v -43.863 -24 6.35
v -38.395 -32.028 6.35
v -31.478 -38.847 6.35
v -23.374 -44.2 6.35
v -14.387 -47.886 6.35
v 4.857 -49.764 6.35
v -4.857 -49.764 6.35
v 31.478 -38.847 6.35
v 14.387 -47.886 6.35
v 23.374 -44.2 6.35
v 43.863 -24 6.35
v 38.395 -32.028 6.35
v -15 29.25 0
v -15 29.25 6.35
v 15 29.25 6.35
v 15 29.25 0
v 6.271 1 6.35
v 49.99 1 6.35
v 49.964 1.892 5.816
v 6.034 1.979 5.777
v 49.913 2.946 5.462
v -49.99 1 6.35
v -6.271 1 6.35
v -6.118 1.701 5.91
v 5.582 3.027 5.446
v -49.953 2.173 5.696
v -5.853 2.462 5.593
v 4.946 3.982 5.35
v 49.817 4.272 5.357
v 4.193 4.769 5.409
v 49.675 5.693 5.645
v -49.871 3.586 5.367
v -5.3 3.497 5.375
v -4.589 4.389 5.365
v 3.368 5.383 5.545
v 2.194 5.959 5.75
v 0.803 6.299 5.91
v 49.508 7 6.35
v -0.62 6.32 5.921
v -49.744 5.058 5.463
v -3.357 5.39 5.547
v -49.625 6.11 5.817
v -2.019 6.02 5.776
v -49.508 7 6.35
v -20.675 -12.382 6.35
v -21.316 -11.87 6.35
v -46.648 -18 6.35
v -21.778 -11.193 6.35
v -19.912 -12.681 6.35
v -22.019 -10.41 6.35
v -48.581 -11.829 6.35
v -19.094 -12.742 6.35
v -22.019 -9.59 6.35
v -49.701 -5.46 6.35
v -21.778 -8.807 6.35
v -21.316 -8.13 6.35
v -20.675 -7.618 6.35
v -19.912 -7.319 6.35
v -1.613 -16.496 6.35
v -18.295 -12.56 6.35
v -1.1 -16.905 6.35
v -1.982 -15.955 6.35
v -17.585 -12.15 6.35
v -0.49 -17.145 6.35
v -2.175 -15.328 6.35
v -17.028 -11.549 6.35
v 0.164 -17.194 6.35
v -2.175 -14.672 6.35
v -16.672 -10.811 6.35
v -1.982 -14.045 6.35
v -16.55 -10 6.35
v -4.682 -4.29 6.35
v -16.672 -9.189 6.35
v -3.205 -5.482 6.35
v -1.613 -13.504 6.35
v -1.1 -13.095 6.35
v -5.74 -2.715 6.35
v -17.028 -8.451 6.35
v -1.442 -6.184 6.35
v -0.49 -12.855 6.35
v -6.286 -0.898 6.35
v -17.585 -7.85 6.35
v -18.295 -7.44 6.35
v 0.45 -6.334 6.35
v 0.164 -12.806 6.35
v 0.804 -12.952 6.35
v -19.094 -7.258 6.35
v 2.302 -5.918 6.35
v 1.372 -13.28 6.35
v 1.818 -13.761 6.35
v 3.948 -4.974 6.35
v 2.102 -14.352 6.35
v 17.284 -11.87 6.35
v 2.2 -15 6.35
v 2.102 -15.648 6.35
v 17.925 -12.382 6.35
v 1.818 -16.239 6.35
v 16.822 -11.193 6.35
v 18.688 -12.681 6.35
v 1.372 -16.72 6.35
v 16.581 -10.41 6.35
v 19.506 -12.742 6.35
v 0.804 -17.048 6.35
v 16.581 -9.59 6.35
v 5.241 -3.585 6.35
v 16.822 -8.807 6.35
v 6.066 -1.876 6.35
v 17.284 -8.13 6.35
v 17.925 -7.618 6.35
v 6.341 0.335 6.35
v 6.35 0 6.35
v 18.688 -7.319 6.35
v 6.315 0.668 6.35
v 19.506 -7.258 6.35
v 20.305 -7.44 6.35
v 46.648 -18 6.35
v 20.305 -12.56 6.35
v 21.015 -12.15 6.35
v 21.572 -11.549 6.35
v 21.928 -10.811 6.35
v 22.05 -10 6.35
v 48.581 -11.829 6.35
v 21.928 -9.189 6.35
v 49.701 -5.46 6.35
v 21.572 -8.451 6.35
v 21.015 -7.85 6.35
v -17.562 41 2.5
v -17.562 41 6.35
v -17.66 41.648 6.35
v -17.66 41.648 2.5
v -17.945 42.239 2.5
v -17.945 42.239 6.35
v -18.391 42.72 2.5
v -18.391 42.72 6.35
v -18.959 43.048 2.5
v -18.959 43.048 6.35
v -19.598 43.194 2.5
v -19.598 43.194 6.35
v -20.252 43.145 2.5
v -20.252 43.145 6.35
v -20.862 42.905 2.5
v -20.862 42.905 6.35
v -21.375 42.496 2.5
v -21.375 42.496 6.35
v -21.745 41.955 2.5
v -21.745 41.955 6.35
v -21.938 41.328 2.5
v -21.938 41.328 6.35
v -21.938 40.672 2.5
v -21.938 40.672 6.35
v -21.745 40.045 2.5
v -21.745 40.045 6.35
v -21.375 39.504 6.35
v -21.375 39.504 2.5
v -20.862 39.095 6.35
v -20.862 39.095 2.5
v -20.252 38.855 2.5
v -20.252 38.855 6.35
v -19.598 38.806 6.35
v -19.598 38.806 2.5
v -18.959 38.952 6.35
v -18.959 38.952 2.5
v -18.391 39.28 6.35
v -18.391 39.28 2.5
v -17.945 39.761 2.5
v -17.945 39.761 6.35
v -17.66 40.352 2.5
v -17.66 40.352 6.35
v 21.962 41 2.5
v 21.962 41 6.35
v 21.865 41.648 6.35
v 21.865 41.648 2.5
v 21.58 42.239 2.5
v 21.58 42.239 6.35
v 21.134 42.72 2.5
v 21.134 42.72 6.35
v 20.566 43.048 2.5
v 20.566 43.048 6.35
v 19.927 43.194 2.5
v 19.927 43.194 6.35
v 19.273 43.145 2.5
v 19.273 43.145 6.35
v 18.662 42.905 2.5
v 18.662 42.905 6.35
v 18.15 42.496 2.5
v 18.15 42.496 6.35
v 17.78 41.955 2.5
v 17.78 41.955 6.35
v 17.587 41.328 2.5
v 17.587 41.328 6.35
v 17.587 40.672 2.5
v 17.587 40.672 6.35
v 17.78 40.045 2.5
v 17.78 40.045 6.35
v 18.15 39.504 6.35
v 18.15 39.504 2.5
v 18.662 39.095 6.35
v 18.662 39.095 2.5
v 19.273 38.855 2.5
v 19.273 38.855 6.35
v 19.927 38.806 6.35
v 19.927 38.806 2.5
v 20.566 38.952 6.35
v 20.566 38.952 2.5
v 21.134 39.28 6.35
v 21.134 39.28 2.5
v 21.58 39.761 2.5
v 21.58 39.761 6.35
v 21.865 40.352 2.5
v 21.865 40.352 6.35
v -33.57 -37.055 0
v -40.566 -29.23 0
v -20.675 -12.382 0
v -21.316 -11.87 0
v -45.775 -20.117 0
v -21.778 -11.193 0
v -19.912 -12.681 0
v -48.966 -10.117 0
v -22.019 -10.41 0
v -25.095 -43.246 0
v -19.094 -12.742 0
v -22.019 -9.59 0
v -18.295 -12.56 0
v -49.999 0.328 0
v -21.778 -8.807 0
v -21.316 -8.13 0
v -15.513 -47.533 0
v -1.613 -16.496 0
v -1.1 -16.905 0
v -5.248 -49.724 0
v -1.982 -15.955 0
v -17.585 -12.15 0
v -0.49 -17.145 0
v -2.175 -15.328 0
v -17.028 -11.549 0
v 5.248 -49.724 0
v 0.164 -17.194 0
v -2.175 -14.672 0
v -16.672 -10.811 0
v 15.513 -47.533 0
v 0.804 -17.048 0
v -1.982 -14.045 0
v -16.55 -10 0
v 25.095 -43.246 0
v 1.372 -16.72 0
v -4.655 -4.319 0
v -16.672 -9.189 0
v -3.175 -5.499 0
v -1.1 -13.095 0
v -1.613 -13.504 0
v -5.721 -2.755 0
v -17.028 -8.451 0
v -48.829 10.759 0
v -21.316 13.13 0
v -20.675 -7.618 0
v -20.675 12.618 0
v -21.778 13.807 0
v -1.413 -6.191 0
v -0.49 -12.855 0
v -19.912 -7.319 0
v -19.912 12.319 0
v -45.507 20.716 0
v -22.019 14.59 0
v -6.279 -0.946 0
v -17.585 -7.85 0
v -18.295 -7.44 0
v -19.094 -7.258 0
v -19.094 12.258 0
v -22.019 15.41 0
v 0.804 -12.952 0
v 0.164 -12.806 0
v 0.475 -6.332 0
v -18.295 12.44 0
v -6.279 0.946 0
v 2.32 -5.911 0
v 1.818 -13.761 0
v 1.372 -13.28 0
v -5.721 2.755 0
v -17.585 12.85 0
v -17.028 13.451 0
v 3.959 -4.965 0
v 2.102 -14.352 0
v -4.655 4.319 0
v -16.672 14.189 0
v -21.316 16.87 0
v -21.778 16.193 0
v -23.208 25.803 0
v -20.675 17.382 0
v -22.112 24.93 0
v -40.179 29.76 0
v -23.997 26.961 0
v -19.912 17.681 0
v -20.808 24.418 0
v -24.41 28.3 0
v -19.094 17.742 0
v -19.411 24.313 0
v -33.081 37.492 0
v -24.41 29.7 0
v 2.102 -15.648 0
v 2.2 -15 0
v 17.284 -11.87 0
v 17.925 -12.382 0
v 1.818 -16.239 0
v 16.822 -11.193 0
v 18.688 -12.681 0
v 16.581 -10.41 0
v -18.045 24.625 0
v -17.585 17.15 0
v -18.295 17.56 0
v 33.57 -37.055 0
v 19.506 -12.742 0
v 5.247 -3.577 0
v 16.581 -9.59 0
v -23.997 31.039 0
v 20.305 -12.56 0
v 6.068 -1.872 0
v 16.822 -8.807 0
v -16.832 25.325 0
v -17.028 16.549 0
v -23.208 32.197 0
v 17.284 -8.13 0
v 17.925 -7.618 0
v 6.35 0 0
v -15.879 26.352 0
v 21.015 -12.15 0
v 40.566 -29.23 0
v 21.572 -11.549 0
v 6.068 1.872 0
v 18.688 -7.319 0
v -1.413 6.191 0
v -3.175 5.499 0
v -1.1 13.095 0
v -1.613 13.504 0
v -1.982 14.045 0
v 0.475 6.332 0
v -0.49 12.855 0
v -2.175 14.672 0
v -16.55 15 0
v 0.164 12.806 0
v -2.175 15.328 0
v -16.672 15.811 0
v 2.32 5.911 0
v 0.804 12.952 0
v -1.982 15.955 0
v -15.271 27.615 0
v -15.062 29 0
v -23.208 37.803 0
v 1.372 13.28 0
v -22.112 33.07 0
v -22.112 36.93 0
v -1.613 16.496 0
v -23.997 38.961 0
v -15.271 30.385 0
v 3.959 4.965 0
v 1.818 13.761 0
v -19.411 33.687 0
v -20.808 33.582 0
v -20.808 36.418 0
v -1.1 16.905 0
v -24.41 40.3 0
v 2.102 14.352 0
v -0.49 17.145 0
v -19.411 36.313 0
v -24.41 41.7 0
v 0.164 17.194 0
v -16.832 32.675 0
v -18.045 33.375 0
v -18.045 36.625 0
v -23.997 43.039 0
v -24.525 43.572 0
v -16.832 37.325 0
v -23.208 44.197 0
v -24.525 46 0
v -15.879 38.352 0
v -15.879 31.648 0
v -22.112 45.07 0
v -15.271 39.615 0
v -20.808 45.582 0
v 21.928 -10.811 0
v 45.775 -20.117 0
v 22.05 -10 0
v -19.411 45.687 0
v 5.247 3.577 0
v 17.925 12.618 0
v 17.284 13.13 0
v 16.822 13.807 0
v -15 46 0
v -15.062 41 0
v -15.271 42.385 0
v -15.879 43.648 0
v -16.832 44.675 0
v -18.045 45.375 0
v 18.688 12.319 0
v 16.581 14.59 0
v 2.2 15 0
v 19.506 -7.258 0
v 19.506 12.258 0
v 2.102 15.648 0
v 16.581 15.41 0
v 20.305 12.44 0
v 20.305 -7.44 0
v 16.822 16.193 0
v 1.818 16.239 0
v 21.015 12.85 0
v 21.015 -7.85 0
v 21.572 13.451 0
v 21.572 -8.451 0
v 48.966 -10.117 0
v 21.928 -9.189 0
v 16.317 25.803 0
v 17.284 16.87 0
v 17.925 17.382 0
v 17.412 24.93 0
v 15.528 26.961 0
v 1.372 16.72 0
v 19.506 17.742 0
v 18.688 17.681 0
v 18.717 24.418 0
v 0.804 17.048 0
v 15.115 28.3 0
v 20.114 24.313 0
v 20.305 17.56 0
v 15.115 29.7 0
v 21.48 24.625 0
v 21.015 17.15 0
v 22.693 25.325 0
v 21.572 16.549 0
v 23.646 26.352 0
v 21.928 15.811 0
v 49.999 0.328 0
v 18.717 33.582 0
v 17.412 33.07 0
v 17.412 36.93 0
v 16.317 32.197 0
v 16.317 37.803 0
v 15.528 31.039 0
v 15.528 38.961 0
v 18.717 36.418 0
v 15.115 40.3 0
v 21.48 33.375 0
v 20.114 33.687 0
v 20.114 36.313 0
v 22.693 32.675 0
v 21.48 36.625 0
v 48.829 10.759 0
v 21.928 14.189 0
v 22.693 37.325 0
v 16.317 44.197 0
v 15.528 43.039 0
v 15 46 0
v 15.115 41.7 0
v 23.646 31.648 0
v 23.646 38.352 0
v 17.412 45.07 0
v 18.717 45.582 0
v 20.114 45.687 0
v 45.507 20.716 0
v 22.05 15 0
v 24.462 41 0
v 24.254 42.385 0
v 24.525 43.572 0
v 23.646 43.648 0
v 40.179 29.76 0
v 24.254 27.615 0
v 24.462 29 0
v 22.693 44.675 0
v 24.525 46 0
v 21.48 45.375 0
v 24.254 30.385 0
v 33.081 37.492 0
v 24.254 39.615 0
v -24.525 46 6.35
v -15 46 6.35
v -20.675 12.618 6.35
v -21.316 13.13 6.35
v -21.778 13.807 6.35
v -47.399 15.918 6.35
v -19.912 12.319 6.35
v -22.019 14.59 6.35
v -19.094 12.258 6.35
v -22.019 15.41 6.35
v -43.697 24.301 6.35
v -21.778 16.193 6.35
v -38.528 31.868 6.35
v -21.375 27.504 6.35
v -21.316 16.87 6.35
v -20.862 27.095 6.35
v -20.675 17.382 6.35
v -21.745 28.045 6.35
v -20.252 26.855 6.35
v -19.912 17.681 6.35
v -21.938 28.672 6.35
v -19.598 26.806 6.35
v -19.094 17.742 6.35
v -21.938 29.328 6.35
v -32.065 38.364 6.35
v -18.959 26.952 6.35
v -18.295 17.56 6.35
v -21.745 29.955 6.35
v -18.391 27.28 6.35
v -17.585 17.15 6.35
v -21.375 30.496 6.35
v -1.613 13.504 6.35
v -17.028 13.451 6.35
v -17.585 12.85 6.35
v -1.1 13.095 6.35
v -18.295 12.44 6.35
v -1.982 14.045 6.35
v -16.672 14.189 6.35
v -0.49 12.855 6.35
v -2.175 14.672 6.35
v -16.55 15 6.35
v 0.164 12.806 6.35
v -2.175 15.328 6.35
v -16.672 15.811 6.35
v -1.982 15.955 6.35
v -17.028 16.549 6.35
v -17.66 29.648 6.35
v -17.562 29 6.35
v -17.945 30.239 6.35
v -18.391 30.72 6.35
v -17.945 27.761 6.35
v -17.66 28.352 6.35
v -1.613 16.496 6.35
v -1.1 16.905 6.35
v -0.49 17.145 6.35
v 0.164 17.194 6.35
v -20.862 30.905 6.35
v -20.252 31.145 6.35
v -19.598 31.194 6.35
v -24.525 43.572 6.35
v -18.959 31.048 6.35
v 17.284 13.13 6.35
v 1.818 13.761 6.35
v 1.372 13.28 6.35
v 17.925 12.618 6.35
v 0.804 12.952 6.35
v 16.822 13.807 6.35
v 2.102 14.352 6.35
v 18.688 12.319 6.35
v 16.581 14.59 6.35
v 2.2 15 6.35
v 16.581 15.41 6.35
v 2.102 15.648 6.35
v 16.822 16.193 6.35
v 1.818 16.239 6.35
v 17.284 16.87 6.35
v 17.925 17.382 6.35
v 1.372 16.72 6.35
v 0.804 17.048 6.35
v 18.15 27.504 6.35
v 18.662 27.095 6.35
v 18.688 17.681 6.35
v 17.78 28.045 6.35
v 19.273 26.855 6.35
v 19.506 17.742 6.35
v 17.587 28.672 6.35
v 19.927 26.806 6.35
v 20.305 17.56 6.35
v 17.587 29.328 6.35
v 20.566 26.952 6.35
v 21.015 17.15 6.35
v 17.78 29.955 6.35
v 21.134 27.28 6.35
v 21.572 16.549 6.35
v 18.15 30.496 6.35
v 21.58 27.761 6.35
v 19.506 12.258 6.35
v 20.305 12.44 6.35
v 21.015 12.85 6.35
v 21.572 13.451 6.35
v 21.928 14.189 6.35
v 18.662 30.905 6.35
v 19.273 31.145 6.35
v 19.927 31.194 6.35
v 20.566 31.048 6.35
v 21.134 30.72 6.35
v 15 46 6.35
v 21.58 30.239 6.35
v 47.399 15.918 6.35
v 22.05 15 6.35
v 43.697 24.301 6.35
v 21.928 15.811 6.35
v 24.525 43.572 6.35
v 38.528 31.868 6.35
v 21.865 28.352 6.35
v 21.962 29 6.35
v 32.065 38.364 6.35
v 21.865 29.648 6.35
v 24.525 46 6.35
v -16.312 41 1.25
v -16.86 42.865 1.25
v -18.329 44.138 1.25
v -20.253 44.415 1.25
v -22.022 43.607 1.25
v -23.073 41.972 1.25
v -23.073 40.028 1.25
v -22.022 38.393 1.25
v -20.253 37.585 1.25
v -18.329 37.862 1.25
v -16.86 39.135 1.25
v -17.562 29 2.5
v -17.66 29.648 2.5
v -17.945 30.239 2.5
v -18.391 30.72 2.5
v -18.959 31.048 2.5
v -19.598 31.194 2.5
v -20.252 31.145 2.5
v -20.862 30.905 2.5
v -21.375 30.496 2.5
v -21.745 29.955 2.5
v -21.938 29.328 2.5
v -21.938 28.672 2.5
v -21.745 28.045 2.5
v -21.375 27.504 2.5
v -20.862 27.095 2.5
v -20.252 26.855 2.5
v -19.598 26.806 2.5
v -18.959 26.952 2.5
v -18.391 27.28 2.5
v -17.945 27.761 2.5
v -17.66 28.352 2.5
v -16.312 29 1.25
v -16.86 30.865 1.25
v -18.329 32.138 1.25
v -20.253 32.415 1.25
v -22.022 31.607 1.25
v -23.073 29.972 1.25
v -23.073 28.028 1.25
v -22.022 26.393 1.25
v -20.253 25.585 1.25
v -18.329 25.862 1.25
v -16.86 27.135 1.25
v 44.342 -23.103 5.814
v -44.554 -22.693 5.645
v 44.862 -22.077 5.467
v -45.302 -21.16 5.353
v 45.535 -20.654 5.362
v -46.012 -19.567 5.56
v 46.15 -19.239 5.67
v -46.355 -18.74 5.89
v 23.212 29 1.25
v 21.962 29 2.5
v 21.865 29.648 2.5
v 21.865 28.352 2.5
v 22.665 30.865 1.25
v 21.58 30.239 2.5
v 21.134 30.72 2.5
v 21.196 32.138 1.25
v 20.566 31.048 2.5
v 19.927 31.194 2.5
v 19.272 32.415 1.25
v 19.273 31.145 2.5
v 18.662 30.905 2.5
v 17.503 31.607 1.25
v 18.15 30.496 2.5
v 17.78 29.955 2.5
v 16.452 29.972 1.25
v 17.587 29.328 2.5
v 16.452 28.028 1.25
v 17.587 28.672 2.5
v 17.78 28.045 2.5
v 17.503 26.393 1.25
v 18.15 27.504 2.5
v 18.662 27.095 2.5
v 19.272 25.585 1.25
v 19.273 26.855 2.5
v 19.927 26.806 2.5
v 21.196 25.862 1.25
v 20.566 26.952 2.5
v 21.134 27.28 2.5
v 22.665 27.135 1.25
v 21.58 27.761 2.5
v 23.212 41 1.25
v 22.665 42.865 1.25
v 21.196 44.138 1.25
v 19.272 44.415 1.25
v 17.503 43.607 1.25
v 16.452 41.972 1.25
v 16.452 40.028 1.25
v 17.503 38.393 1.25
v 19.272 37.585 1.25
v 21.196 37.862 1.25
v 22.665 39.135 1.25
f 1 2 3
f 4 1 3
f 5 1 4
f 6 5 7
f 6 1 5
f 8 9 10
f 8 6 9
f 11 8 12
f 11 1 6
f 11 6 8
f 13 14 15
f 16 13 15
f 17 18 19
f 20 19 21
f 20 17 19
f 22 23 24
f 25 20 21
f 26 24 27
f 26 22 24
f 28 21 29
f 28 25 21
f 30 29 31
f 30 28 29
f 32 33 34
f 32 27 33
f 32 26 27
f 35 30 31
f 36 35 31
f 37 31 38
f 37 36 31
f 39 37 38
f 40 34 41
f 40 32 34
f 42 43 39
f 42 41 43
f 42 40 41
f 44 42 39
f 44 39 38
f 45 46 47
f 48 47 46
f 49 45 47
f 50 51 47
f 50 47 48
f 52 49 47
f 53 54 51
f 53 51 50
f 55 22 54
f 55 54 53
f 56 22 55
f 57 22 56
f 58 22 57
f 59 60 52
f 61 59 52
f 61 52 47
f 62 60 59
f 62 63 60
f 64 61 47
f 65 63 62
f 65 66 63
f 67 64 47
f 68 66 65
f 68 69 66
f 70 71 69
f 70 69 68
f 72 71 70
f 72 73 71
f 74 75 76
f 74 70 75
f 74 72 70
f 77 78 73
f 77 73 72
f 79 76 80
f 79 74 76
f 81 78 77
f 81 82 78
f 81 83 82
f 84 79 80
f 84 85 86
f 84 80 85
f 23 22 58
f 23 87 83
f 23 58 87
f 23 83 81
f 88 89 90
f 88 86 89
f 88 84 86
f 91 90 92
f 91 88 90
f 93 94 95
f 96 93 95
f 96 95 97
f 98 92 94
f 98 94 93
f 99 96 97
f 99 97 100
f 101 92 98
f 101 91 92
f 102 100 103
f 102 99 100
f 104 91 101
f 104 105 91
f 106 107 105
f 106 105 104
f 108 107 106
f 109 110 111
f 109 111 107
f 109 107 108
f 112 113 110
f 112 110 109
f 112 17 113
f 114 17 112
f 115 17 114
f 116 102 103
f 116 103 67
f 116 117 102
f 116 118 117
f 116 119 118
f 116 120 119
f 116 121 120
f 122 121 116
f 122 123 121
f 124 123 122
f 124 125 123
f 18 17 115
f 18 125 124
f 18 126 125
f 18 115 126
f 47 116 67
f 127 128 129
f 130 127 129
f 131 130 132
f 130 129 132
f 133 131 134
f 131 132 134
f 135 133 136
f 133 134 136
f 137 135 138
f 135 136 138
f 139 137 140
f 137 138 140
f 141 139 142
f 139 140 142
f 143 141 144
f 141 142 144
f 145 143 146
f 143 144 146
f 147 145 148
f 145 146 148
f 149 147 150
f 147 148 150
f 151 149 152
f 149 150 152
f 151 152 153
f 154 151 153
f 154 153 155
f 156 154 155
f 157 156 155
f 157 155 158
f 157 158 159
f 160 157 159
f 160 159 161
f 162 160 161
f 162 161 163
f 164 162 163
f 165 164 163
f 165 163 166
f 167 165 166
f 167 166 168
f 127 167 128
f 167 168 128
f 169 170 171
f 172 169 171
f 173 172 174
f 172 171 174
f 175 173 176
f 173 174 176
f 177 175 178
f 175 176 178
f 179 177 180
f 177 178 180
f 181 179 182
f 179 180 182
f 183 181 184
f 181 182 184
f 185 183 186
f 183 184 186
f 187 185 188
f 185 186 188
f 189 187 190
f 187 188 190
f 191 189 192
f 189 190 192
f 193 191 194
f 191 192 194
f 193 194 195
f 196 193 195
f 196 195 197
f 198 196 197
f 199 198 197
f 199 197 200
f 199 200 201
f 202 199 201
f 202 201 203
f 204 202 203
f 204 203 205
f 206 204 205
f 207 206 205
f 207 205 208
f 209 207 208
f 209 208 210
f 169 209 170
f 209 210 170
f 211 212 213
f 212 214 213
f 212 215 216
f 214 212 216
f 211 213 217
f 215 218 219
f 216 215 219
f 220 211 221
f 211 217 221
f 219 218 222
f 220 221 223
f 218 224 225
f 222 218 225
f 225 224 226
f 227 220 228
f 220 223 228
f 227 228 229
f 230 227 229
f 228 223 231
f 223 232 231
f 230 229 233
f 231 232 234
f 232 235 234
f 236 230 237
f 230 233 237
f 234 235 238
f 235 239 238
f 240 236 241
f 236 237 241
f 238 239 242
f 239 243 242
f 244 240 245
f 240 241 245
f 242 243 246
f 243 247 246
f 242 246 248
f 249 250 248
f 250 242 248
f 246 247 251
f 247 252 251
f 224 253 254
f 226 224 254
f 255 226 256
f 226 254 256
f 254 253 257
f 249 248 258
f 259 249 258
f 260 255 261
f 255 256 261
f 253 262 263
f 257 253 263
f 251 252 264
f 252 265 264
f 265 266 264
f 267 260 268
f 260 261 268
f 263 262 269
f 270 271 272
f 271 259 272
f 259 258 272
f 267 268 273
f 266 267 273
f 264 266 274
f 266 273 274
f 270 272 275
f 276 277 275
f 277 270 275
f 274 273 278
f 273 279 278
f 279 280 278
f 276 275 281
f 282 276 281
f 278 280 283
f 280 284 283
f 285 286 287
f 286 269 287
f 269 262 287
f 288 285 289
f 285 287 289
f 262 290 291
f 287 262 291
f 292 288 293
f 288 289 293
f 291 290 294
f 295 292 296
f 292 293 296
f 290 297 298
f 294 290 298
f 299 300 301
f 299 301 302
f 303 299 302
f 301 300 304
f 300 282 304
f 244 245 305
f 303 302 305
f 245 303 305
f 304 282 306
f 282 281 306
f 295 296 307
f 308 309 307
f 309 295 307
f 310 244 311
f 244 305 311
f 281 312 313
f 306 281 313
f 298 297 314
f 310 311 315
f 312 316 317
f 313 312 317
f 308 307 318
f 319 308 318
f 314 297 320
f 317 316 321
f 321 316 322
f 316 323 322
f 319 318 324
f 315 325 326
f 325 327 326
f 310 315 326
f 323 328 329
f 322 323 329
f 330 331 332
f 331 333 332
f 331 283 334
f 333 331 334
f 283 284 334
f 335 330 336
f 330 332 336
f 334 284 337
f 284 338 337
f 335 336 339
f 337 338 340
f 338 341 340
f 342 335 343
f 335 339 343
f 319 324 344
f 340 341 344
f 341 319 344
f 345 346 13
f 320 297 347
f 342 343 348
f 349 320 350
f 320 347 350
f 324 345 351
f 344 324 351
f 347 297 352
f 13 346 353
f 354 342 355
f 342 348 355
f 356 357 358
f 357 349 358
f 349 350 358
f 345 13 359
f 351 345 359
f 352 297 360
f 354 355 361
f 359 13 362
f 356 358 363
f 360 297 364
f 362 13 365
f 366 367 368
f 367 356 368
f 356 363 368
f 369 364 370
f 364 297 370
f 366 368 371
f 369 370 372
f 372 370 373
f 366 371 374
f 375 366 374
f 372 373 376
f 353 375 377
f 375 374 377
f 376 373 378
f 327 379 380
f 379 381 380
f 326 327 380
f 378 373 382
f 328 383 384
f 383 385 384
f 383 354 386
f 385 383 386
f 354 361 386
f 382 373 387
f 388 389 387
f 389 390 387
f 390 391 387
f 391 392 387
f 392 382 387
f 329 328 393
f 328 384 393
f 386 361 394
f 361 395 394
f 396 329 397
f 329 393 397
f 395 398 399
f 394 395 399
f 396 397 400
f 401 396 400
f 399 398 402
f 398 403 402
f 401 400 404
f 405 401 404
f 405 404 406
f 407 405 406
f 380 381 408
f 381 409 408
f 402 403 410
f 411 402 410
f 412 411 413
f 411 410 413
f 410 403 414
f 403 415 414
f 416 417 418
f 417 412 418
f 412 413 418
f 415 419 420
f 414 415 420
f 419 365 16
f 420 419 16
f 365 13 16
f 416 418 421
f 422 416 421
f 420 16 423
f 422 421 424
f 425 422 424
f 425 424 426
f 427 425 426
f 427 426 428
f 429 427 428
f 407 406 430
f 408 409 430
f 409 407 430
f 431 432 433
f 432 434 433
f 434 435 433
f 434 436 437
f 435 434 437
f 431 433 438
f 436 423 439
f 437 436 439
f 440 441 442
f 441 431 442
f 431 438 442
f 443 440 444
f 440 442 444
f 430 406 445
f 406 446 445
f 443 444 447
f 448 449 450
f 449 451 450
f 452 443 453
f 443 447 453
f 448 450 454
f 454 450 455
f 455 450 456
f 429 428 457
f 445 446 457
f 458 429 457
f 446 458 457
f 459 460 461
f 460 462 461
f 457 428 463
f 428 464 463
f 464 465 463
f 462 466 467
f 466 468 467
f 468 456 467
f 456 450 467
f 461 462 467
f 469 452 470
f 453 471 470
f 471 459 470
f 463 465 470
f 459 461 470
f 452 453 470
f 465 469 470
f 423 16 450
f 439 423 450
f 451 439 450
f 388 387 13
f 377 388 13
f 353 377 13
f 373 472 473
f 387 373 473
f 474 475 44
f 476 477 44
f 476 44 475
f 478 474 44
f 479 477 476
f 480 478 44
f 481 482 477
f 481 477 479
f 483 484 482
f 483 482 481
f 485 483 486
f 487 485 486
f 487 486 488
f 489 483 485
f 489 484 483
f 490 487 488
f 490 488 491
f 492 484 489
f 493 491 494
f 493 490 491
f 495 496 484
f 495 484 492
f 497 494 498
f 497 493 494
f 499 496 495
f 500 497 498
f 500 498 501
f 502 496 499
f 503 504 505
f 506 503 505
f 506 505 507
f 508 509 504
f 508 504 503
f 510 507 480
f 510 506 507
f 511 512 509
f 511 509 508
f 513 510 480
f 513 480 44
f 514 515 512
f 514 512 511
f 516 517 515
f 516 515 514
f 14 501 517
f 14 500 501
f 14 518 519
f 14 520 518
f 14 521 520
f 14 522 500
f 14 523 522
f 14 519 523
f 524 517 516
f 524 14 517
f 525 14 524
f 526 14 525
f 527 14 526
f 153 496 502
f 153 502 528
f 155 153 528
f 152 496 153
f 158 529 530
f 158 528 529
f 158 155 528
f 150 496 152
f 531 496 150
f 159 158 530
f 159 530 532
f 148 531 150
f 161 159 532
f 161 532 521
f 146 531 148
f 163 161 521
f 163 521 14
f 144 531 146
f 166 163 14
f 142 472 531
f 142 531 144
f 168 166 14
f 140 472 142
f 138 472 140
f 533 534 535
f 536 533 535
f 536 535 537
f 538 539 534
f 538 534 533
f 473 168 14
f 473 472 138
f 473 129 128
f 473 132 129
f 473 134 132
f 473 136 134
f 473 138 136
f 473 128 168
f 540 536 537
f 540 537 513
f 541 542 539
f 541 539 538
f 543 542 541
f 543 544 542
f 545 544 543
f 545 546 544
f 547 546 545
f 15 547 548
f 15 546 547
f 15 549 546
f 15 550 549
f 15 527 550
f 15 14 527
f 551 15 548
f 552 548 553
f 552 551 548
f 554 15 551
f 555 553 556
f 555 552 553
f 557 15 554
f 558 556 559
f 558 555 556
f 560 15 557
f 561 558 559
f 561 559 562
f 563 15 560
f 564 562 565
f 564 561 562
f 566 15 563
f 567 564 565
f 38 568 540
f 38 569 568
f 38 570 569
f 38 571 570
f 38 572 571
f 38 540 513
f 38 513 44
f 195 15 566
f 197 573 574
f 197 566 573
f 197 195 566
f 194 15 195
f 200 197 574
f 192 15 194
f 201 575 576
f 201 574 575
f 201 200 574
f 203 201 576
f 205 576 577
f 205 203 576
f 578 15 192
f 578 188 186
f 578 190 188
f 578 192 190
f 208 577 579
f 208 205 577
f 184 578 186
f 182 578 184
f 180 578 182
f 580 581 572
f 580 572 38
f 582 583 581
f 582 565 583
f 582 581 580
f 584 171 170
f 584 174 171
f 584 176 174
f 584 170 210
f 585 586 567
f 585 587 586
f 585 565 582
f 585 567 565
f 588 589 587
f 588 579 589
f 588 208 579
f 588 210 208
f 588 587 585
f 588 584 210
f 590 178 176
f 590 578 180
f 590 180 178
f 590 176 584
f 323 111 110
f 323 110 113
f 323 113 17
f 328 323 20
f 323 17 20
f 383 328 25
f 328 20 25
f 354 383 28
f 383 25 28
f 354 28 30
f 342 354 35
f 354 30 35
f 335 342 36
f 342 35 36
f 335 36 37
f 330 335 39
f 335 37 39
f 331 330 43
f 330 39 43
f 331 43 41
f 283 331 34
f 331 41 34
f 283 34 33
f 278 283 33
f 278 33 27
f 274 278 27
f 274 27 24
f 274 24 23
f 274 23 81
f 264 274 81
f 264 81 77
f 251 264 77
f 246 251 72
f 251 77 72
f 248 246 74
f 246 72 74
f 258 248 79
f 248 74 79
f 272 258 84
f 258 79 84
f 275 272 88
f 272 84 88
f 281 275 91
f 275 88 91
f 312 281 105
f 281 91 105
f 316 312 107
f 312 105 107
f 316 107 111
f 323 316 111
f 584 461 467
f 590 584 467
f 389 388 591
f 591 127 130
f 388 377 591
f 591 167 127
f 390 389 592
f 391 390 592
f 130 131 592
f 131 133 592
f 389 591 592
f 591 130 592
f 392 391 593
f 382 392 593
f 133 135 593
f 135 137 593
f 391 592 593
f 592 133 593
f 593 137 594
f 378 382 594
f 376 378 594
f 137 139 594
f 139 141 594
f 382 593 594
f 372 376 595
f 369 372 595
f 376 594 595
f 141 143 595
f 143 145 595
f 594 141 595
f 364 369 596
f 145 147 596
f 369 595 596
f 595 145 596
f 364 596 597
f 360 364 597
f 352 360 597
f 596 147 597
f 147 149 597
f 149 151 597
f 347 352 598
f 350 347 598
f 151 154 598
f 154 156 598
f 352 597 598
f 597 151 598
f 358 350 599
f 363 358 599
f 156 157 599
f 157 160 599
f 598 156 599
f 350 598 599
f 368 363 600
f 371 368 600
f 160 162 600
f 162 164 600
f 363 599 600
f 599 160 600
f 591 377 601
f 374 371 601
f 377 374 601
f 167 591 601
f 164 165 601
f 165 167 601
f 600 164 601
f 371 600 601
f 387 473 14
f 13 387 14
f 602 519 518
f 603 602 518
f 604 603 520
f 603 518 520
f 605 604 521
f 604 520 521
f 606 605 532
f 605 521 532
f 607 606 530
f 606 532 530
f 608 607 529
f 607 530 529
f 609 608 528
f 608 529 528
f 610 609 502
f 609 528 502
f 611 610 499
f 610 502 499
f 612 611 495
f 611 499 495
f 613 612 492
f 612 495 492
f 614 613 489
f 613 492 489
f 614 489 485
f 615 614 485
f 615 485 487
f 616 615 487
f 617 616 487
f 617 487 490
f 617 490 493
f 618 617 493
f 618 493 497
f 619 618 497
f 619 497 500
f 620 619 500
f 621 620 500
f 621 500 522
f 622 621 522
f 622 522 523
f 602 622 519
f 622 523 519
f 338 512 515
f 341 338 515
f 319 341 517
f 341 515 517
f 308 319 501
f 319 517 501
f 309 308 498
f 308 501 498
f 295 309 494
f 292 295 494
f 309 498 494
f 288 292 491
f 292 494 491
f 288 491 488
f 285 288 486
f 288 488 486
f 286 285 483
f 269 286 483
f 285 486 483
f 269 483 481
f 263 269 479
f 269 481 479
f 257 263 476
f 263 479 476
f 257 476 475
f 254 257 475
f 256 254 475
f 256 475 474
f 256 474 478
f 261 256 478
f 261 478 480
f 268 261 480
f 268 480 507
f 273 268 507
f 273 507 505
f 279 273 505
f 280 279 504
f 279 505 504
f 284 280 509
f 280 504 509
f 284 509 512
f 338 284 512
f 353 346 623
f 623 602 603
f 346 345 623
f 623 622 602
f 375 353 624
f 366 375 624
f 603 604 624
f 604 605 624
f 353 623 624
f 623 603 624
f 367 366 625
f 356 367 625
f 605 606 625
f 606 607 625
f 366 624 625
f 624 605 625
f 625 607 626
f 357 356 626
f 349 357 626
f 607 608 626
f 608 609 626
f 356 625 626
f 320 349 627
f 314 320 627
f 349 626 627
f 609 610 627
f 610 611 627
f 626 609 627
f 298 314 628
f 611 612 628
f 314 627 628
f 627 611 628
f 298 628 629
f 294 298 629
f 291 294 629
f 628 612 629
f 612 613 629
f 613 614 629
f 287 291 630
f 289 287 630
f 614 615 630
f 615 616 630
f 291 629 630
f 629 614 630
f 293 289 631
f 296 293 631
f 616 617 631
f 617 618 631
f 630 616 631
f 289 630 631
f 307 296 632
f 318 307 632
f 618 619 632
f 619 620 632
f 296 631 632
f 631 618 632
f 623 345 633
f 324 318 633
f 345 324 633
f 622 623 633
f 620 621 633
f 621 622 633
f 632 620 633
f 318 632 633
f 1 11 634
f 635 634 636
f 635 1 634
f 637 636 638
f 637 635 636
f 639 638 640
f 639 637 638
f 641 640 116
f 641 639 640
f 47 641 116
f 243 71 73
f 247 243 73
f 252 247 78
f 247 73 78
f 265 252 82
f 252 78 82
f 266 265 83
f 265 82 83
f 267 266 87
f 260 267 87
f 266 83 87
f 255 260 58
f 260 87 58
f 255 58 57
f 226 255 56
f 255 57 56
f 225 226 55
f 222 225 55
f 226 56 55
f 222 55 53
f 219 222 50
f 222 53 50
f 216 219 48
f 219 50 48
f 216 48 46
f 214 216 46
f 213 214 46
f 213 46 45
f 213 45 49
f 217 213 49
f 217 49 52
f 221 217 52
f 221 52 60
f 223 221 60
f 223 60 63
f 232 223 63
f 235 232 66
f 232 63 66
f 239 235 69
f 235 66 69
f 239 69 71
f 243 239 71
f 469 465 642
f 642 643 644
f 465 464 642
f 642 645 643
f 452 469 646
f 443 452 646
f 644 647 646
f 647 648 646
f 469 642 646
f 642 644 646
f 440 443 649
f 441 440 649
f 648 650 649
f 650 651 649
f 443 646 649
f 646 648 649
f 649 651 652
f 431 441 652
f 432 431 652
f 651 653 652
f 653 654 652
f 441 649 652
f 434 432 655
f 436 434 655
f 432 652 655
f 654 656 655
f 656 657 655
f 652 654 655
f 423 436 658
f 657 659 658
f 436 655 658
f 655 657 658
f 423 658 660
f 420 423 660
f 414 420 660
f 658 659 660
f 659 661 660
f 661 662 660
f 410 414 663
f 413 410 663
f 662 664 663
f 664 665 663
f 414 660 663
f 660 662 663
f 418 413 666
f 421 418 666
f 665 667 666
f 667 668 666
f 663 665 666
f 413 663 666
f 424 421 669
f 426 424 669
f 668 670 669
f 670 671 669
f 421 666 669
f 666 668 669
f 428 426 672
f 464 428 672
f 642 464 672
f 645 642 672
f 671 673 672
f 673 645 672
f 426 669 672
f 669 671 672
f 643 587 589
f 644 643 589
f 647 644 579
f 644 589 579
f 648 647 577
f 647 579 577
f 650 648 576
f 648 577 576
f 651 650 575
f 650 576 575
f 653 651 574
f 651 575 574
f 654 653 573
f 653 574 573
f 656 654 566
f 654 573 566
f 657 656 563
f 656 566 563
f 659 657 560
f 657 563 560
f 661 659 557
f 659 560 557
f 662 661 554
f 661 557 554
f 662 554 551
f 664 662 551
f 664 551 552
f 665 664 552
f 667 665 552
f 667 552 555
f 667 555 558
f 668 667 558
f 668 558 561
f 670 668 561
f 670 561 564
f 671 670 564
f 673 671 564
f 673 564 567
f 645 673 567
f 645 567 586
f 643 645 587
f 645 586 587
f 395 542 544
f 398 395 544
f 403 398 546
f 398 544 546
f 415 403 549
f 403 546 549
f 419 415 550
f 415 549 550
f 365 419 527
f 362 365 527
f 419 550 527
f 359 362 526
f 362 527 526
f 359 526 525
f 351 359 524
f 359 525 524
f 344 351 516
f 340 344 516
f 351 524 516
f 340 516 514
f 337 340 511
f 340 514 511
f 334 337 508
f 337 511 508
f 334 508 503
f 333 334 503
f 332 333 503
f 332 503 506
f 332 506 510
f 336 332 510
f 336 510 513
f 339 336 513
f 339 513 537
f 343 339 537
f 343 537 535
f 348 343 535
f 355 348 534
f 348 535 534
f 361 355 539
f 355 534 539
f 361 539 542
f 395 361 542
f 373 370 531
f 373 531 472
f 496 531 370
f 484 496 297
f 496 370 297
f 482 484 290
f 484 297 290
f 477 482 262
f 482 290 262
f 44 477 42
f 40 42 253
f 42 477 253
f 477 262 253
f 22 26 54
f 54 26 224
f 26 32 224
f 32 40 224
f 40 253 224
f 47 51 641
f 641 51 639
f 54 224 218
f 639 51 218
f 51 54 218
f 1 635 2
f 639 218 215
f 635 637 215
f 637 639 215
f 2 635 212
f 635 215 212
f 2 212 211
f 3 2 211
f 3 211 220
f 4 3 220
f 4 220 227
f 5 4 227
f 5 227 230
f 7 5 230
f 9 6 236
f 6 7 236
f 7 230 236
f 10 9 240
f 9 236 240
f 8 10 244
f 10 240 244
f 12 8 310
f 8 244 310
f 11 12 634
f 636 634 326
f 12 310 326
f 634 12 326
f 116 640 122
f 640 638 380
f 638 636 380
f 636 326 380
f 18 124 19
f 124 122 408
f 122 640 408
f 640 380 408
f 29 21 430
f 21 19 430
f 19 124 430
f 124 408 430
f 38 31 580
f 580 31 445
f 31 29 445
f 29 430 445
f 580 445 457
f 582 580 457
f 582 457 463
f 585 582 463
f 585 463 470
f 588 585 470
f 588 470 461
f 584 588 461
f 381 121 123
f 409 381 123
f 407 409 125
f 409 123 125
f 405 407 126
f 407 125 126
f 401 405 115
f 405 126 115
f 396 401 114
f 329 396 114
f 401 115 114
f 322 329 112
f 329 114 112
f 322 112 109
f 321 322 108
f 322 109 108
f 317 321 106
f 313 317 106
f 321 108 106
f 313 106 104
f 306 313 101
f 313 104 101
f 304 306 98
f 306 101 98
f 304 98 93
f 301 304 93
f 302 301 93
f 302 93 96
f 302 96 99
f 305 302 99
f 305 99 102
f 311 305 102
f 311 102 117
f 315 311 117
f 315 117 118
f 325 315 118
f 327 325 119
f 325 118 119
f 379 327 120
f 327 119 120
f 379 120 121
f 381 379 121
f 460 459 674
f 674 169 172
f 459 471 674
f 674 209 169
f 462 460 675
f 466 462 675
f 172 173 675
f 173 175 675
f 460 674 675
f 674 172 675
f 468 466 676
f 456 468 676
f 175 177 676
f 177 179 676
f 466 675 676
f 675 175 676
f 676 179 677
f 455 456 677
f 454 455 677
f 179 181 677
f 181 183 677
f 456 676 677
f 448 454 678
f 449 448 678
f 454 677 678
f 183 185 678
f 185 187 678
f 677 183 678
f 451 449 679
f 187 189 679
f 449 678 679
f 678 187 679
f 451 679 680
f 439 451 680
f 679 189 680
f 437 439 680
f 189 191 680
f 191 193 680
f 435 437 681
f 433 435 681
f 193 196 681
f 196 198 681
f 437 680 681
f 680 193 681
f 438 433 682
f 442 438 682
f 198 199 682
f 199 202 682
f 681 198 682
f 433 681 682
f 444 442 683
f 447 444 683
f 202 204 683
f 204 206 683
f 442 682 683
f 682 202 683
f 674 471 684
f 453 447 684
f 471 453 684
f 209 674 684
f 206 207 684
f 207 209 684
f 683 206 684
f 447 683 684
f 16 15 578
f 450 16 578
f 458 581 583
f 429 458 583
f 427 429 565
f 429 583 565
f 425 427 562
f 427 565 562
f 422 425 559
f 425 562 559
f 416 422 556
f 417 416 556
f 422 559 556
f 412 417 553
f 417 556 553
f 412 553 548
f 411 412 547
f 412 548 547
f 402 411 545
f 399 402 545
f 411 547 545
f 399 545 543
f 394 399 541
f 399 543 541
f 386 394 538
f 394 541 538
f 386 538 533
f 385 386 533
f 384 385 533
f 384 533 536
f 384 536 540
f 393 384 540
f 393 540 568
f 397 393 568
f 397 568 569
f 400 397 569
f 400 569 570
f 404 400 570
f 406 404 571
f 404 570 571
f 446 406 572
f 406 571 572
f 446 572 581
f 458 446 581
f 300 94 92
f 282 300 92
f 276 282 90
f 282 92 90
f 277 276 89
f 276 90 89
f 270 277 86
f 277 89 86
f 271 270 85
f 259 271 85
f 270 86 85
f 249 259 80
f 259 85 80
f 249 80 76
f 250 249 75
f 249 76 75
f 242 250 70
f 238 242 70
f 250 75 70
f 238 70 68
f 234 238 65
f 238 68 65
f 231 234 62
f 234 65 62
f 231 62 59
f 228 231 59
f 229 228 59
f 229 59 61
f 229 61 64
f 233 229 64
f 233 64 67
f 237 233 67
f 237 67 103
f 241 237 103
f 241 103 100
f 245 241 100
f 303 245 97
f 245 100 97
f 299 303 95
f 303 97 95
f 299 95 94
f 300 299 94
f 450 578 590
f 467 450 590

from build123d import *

# Parameters (mm, degrees)
SKETCH1_R               = 50
EXTRUDE_1_4_DEPTH       = 6.35
CUT_EXTRUDE1_DEPTH      = 6.35
SKETCH3_W               = 9.525
SKETCH3_H               = 16.75
BOSS_EXTRUDE2_DEPTH     = 6.35
SKETCH4_R               = 2.2
M4_THROUGH_DEPTH        = 6.35
SKETCH5_R               = 6.35
CUT_EXTRUDE2_DEPTH      = 6.35
SKETCH6_R               = 2.2
M4_THROUGH2_DEPTH       = 6.35
SKETCH7_R               = 2.75
M5_THROUGH_DEPTH        = 6.35
CHAMFER1_SIZE           = 2.5
CUT_EXTRUDE4_DEPTH      = 71.995228713
CUT_EXTRUDE4_DEPTH_BACK = 71.995228713
SKETCH8_R               = 5


with BuildPart() as part:
    # Sketch1 → 1/4 (new body)
    with BuildSketch(Plane.XY):
        Circle(SKETCH1_R)
    extrude(amount=EXTRUDE_1_4_DEPTH)

    # Sketch2 → Cut-Extrude1 (cut)
    with BuildSketch(Plane.XY.offset(6.35)):
        Polygon((-15, 46), (-15, 29.25), (15, 29.25), (15, 46), (28.100203936, 46), (28.100203936, 76.142415264), (-30.736146894, 76.142415264), (-30.736146894, 46), align=None)
    extrude(amount=-CUT_EXTRUDE1_DEPTH, mode=Mode.SUBTRACT)

    # Sketch3 → Boss-Extrude2 (add)
    with BuildSketch(Plane.XY.offset(6.35)):
        with Locations((-19.7625, 37.625)):
            Rectangle(SKETCH3_W, SKETCH3_H)
        with Locations((19.7625, 37.625)):
            Rectangle(SKETCH3_W, SKETCH3_H)
    extrude(amount=-BOSS_EXTRUDE2_DEPTH)

    # Sketch4 → M4_through (cut)
    with BuildSketch(Plane.XY.offset(6.35)):
        with Locations((-19.7625, 41)):
            Circle(SKETCH4_R)
        with Locations((-19.7625, 29)):
            Circle(SKETCH4_R)
        with Locations((19.7625, 29)):
            Circle(SKETCH4_R)
        with Locations((19.7625, 41)):
            Circle(SKETCH4_R)
    extrude(amount=-M4_THROUGH_DEPTH, mode=Mode.SUBTRACT)

    # Sketch5 → Cut-Extrude2 (cut)
    with BuildSketch(Plane.XY.offset(6.35)):
        Circle(SKETCH5_R)
    extrude(amount=-CUT_EXTRUDE2_DEPTH, mode=Mode.SUBTRACT)

    # Sketch6 → M4_through2 (cut)
    with BuildSketch(Plane.XY.offset(6.35)):
        with Locations((0, 15)):
            Circle(SKETCH6_R)
        with Locations((0, -15)):
            Circle(SKETCH6_R)
    extrude(amount=-M4_THROUGH2_DEPTH, mode=Mode.SUBTRACT)

    # Sketch7 → M5_through (cut)
    with BuildSketch(Plane.XY.offset(6.35)):
        with Locations((-19.3, 15)):
            Circle(SKETCH7_R)
        with Locations((-19.3, -10)):
            Circle(SKETCH7_R)
        with Locations((19.3, -10)):
            Circle(SKETCH7_R)
        with Locations((19.3, 15)):
            Circle(SKETCH7_R)
    extrude(amount=-M5_THROUGH_DEPTH, mode=Mode.SUBTRACT)

    # Chamfer1
    chamfer1_edges = [part.edges().sort_by_distance(p)[0] for p in [
        (17.5625, 41, 0),
        (17.5625, 29, 0),
        (-21.9625, 29, 0),
        (-21.9625, 41, 0),
    ]]
    chamfer(chamfer1_edges, length=CHAMFER1_SIZE)

    # Sketch8 → Cut-Extrude4 (cut, two sides: drawn at the far end of the back side and taken through both)
    with BuildSketch(Plane(origin=(0, 0, 0), x_dir=(0, 0, -1), z_dir=(1, 0, 0)).offset(-CUT_EXTRUDE4_DEPTH_BACK)):
        with Locations((-10.35, 4)):
            Circle(SKETCH8_R)
        with Locations((-10.35, -21)):
            Circle(SKETCH8_R)
    extrude(amount=CUT_EXTRUDE4_DEPTH + CUT_EXTRUDE4_DEPTH_BACK, mode=Mode.SUBTRACT)


solid = part.part
